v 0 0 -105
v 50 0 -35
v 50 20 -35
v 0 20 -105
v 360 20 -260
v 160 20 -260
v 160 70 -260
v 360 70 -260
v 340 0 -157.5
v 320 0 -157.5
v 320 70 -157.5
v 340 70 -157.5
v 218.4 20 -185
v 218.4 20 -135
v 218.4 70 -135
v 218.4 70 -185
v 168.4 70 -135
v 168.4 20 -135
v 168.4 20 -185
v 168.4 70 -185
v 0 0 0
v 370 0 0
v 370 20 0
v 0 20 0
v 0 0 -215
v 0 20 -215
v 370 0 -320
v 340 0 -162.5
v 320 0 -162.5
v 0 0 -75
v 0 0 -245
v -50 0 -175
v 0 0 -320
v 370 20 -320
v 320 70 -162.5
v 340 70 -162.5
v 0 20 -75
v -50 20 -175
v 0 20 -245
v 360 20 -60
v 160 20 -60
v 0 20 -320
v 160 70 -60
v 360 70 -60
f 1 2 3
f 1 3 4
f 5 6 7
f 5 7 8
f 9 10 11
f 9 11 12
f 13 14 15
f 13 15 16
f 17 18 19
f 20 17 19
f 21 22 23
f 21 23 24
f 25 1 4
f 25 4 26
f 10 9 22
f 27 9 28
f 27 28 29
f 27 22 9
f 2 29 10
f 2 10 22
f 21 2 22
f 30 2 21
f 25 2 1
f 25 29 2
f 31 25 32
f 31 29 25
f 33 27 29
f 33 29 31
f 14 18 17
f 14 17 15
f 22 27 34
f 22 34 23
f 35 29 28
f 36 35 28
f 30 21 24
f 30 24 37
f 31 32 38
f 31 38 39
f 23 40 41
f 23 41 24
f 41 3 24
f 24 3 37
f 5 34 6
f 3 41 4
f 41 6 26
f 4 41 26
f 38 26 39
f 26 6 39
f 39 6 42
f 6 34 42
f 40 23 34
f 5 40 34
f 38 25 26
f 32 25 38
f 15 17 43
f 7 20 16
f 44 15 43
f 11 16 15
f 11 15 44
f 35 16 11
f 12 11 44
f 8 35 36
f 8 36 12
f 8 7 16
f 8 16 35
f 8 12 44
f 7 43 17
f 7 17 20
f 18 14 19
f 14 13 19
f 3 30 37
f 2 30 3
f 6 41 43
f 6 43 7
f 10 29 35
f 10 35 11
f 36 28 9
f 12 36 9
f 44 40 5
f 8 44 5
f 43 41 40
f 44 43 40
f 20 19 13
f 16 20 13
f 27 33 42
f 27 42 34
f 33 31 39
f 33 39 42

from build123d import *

# Parameters (mm, degrees)
BOSS_EXTRUDE1_DEPTH     = 20
CUT_EXTRUDE1_DEPTH      = 490.591666596
CUT_EXTRUDE1_DEPTH_BACK = 490.591666596
SKETCH2_W               = 20
SKETCH2_H               = 5
SKETCH3_W               = 200
SKETCH3_H               = 200
SKETCH3_W_2             = 50
SKETCH3_H_2             = 50
BOSS_EXTRUDE2_DEPTH     = 50
SKETCH4_W               = 20
SKETCH4_H               = 5
CUT_EXTRUDE2_DEPTH      = 495.165964024


with BuildPart() as part:
    # Sketch1 → Boss-Extrude1 (new body)
    with BuildSketch(Plane(origin=(0, 0, 0), x_dir=(1, 0, 0), z_dir=(0, 1, 0))):
        Polygon((0, 75), (50, 35), (0, 105), (0, 215), (-50, 175), (0, 245), (0, 320), (370, 320), (370, 0), (0, 0), align=None)
    extrude(amount=BOSS_EXTRUDE1_DEPTH)

    # Sketch2 → Cut-Extrude1 (cut, two sides: drawn at the far end of the back side and taken through both)
    with BuildSketch(Plane.XZ.offset(-CUT_EXTRUDE1_DEPTH_BACK)):
        with Locations((330, -160)):
            Rectangle(SKETCH2_W, SKETCH2_H)
    extrude(amount=CUT_EXTRUDE1_DEPTH + CUT_EXTRUDE1_DEPTH_BACK, mode=Mode.SUBTRACT)

    # Sketch3 → Boss-Extrude2 (add)
    with BuildSketch(Plane(origin=(0, 20, 0), x_dir=(1, 0, 0), z_dir=(0, 1, 0))):
        with Locations((260, 160)):
            Rectangle(SKETCH3_W, SKETCH3_H)
        with Locations((193.4, 160)):
            Rectangle(SKETCH3_W_2, SKETCH3_H_2, mode=Mode.SUBTRACT)
    extrude(amount=BOSS_EXTRUDE2_DEPTH)

    # Sketch4 → Cut-Extrude2 (cut, through all)
    with BuildSketch(Plane.XZ):
        with Locations((330, -160)):
            Rectangle(SKETCH4_W, SKETCH4_H)
    extrude(amount=-CUT_EXTRUDE2_DEPTH, mode=Mode.SUBTRACT)


solid = part.part
